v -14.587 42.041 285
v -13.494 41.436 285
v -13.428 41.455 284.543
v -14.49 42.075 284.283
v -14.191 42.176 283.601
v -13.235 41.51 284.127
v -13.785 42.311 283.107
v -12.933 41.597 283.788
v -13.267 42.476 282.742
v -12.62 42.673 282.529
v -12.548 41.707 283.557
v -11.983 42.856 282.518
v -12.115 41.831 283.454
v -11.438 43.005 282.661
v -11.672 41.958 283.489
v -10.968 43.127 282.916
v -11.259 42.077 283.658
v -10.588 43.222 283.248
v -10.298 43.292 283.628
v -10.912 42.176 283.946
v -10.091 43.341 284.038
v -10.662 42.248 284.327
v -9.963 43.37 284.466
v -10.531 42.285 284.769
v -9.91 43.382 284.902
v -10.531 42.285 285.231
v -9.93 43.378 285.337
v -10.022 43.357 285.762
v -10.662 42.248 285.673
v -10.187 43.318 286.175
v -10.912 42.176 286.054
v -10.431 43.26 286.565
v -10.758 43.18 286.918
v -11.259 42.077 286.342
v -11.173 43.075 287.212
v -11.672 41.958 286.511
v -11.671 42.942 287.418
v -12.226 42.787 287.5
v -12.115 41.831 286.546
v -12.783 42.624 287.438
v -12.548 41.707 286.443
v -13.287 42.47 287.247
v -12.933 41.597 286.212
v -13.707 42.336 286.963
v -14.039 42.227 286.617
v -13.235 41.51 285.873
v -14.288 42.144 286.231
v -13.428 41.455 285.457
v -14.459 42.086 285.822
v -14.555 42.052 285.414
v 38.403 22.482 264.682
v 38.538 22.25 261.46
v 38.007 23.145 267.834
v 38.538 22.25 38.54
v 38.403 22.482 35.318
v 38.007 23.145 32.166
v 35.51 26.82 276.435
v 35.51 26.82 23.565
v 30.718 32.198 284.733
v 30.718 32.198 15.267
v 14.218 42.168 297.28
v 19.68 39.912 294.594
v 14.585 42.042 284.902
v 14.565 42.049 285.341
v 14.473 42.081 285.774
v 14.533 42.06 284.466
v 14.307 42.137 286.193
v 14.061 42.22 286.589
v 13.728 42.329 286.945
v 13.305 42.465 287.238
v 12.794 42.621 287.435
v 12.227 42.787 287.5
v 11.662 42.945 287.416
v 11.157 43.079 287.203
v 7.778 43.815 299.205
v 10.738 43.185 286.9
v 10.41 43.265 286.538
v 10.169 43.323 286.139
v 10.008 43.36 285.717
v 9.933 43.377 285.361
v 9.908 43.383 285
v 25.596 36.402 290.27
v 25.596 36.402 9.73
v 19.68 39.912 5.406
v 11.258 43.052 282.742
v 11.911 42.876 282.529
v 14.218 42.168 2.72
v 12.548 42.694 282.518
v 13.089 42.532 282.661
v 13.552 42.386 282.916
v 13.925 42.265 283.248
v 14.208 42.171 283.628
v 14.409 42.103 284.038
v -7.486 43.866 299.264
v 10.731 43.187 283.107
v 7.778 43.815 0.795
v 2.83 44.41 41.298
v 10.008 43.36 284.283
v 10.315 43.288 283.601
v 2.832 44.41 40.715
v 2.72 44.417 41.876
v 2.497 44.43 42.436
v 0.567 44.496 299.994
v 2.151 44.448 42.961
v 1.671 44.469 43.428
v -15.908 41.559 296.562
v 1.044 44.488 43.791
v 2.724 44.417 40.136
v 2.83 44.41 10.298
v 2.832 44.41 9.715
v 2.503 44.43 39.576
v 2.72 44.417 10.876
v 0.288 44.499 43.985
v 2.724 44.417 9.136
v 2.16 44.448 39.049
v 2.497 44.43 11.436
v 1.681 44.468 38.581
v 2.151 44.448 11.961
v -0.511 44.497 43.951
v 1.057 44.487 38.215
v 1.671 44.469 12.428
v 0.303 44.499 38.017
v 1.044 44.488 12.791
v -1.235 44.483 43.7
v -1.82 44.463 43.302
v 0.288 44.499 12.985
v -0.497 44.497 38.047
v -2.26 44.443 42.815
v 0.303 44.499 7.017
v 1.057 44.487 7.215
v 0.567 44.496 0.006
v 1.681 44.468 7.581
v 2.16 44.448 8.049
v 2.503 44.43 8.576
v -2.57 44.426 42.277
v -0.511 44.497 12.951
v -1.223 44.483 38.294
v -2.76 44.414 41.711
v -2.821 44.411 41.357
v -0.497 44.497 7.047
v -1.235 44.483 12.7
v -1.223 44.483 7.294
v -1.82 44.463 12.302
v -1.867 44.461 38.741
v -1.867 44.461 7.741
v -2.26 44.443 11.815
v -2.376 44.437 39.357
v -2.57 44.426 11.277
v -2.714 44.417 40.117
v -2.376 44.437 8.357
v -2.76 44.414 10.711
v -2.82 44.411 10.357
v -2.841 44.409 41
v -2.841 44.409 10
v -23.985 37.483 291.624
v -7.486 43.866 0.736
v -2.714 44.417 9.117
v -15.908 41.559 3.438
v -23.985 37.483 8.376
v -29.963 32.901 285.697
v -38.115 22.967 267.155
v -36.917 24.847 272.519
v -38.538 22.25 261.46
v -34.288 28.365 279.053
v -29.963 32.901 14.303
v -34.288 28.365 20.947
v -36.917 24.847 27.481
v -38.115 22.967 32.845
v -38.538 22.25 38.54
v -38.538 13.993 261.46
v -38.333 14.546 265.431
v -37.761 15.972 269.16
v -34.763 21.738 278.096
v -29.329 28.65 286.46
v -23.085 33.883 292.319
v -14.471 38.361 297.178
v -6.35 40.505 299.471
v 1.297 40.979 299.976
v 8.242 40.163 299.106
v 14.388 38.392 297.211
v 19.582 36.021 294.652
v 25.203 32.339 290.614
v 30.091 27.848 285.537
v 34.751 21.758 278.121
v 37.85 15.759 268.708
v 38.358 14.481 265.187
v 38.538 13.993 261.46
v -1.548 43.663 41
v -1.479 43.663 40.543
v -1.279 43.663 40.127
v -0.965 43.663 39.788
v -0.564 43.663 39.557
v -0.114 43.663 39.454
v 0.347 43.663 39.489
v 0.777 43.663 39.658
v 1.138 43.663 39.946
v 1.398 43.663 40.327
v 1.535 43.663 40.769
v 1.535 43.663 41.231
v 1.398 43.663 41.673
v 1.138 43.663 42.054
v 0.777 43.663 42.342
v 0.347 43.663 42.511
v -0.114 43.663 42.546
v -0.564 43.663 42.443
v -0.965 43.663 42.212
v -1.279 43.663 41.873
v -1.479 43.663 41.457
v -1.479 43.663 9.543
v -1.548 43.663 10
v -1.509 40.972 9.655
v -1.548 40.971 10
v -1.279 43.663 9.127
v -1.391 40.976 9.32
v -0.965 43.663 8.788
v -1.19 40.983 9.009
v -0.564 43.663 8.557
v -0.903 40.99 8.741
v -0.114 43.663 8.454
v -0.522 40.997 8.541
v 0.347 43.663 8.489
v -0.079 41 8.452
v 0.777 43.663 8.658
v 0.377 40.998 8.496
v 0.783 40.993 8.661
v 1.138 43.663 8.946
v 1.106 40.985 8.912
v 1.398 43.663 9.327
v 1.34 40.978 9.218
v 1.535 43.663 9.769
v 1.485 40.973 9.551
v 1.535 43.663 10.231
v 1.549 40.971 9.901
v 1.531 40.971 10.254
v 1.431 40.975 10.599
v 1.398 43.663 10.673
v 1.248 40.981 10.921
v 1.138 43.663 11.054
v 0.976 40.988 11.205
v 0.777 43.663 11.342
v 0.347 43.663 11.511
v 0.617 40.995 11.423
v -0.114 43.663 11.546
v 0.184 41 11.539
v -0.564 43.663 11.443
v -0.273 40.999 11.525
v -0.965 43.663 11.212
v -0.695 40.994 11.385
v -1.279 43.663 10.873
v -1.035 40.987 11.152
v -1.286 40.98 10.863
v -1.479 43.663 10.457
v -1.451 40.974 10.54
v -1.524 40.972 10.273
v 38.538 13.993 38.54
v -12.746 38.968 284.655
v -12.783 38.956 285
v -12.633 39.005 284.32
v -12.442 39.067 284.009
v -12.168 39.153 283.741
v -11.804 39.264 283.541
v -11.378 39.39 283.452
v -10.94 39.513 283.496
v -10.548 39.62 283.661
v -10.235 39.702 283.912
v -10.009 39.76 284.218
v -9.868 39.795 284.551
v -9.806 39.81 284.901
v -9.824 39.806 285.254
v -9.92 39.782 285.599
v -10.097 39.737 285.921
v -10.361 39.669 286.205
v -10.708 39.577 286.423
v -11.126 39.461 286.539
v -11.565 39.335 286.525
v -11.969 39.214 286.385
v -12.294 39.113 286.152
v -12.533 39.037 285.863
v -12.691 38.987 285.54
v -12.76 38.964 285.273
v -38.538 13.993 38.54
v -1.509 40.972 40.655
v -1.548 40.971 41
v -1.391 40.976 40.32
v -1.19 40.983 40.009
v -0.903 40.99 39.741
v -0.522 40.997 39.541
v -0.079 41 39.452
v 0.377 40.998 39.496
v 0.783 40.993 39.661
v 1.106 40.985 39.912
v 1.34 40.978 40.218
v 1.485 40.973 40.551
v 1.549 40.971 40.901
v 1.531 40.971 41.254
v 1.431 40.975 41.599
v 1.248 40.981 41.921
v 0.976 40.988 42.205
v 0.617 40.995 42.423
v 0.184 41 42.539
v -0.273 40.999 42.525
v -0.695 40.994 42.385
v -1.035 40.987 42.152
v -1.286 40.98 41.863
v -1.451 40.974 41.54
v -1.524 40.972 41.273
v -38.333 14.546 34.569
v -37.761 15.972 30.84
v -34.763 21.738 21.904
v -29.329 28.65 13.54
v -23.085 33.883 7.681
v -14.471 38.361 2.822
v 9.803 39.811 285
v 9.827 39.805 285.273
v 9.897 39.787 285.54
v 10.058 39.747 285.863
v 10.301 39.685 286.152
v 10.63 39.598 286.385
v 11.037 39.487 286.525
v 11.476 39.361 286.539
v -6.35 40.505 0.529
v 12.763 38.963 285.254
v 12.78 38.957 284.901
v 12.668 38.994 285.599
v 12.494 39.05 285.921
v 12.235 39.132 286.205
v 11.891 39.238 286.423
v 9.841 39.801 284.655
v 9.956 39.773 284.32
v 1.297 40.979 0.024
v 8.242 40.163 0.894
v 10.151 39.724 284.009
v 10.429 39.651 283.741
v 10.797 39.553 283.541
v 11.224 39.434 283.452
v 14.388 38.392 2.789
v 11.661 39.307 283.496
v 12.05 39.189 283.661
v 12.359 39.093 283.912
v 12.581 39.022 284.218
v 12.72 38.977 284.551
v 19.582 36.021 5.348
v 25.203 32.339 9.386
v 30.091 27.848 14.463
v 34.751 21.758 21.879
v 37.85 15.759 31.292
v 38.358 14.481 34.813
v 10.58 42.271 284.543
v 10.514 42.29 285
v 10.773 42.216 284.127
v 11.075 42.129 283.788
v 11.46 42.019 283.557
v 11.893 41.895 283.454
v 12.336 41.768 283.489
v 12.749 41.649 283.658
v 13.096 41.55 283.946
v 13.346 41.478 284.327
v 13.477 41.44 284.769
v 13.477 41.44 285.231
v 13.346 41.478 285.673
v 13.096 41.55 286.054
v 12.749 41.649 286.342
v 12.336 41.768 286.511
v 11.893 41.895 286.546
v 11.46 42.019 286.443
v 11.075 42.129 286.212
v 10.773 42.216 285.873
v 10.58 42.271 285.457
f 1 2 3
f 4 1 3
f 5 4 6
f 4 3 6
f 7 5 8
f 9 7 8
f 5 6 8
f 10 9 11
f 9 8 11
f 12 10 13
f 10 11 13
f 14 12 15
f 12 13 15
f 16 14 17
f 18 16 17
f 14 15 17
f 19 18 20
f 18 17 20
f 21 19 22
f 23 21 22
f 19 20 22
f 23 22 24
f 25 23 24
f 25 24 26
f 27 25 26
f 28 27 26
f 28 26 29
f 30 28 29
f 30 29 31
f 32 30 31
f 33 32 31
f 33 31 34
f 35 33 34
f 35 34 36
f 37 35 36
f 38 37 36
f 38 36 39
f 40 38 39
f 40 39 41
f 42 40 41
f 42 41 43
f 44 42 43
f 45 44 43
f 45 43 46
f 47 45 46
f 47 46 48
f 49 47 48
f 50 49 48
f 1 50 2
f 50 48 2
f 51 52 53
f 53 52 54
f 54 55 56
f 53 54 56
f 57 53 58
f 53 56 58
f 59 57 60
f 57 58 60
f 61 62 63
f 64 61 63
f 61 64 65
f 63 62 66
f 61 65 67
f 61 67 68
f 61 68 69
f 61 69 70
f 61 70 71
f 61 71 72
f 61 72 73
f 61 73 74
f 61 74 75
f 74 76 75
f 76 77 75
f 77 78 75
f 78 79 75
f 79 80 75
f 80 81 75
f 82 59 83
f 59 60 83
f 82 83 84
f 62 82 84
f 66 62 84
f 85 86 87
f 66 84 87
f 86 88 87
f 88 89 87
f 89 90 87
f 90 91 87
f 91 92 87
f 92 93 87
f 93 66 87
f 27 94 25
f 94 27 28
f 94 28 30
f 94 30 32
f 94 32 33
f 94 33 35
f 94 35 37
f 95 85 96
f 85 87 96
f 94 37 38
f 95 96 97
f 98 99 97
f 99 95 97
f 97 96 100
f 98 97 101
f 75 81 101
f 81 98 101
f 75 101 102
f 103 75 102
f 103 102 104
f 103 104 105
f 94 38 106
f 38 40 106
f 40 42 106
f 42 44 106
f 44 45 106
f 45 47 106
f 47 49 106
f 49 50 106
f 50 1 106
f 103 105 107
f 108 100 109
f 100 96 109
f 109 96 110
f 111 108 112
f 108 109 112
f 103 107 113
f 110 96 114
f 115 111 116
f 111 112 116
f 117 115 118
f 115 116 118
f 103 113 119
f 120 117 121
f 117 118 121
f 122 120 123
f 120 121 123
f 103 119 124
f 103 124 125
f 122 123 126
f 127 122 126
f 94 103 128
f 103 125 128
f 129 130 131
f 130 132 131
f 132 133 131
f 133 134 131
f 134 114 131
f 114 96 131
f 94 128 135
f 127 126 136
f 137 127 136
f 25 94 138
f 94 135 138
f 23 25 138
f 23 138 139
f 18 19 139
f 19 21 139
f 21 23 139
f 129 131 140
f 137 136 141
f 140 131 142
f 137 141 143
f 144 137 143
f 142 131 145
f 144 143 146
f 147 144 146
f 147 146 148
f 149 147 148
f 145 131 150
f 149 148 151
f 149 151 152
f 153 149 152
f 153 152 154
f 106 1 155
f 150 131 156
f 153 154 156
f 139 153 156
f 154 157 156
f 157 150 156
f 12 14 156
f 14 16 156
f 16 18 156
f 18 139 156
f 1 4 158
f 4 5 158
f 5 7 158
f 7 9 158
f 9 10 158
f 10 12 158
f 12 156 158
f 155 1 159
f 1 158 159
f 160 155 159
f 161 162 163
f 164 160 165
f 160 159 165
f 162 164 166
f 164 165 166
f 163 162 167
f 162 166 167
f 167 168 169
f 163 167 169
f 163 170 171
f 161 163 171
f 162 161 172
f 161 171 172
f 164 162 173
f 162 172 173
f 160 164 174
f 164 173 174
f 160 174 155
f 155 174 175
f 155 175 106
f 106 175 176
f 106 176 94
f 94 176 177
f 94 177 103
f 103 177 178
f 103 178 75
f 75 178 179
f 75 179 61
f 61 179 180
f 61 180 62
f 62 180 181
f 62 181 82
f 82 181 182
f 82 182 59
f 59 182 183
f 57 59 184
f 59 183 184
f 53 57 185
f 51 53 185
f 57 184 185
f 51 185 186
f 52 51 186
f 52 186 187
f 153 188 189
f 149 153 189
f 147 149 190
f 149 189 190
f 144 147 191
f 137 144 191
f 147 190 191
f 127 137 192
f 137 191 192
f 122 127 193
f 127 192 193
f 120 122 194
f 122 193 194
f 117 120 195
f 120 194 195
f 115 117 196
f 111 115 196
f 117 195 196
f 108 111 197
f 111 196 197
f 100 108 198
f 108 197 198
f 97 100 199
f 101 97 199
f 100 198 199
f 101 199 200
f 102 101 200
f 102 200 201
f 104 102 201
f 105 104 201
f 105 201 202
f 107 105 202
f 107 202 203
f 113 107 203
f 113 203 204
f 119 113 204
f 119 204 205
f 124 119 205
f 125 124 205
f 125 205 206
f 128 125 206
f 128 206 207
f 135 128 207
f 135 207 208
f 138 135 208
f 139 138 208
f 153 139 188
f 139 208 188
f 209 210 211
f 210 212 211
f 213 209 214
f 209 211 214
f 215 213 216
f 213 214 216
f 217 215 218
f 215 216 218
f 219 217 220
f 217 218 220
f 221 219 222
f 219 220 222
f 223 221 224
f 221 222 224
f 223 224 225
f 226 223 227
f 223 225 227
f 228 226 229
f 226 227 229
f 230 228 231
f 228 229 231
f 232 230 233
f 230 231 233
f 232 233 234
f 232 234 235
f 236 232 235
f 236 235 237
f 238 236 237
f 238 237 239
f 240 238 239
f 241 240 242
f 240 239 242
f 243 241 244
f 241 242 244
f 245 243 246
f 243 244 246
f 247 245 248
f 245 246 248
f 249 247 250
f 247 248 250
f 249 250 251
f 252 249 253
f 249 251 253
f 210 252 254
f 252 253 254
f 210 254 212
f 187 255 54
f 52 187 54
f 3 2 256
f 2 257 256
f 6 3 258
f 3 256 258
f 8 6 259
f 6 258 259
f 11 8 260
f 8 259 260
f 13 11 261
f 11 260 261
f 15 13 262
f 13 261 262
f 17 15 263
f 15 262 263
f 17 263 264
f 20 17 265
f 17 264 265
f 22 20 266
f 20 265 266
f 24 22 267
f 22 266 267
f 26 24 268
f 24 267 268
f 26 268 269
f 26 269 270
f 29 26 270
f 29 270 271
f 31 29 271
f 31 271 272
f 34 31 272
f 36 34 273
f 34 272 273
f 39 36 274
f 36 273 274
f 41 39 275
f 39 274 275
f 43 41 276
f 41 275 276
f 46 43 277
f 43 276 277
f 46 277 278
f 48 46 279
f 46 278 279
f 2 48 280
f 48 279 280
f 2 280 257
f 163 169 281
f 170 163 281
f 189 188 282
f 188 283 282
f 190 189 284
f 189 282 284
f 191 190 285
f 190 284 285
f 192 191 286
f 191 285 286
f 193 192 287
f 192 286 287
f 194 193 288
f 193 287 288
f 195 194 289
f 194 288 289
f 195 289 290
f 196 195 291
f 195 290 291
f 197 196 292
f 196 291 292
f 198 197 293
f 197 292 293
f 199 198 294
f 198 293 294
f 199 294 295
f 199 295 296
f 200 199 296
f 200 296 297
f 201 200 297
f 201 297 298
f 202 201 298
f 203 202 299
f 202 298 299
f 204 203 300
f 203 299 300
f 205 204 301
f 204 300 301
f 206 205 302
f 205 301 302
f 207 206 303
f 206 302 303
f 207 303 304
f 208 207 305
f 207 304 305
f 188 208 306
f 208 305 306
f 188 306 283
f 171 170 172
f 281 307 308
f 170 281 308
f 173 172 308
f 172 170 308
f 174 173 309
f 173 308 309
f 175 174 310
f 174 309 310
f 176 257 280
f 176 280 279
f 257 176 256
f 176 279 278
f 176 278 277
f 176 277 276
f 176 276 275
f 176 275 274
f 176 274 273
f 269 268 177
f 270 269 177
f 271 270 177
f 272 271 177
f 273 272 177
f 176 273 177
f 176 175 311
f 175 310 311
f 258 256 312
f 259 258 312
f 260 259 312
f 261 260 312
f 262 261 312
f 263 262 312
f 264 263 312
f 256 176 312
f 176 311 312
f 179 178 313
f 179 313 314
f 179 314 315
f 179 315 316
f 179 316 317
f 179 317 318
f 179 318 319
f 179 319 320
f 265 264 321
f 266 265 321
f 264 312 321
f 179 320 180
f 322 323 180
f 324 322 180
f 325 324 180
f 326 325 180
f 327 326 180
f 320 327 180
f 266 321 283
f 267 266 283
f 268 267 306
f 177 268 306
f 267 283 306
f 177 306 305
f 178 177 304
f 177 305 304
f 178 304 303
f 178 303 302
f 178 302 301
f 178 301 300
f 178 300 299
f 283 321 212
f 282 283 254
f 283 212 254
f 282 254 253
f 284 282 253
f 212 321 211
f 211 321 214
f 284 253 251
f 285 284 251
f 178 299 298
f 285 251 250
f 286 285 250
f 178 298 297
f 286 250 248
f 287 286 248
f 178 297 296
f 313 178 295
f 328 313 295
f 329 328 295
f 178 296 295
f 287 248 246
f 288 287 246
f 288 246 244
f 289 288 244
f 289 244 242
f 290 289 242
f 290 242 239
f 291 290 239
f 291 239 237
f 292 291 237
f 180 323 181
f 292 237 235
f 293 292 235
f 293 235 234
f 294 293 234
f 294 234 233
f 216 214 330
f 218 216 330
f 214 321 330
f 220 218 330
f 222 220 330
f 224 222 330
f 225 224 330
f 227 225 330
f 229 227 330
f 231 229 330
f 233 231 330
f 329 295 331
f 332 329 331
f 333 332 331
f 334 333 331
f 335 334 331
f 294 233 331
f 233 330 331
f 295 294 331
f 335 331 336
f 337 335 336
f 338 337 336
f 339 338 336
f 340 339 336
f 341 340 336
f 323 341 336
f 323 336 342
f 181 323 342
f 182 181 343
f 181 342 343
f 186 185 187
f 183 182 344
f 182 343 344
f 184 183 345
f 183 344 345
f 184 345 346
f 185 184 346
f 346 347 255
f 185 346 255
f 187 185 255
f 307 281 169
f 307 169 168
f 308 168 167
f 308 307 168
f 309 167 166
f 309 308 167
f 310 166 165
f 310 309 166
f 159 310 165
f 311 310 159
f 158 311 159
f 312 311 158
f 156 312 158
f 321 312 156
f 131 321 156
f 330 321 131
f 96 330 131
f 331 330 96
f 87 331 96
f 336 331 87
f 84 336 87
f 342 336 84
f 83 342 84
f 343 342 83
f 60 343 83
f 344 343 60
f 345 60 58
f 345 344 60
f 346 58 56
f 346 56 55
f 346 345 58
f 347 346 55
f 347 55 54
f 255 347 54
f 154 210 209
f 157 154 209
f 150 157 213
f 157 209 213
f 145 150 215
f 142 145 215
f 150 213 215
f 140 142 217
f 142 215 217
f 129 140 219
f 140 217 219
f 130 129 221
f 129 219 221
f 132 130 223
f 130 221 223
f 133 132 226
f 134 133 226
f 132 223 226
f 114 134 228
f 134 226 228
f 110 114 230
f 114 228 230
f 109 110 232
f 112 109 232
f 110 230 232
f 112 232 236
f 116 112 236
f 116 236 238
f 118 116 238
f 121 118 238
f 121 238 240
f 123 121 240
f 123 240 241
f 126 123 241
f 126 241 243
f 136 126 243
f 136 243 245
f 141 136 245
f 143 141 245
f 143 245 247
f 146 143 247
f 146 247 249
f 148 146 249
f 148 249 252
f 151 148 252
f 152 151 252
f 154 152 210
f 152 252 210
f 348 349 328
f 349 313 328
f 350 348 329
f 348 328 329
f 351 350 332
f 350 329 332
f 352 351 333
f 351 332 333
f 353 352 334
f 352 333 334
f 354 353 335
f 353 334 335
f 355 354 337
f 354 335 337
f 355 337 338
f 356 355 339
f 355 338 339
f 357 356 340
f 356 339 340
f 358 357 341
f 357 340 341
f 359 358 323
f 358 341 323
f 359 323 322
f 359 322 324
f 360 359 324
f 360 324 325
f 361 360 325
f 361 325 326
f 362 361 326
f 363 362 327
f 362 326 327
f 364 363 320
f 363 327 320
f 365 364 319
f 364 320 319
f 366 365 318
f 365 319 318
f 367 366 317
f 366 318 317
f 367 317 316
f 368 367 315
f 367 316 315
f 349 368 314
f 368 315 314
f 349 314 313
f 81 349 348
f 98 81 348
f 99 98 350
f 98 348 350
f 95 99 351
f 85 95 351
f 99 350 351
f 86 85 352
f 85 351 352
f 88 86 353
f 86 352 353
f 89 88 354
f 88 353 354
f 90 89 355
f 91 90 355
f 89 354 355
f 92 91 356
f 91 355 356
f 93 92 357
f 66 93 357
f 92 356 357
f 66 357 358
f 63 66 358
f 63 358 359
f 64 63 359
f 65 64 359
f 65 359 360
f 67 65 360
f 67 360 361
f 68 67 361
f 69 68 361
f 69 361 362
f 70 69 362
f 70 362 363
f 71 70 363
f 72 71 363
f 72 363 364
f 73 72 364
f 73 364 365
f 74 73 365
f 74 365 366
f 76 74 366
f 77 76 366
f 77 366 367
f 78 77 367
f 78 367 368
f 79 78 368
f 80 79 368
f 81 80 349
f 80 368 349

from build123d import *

# Parameters (mm, degrees)
BOSS_EXTRU_1_DEPTH                   = 300
ENL_V_MAT_EXTRU_1_DEPTH              = 45.5
D_GAGEMENT_M21_D                     = 3.1
D_GAGEMENT_M21_CSINK_D               = 6
D_GAGEMENT_M21_CSINK_ANGLE           = 120
R_P_TITION_LIN_AIRE1_COUNT           = 2
R_P_TITION_LIN_AIRE1_PITCH           = 31
D_GAGEMENT_M41_D                     = 3.1
D_GAGEMENT_M41_DEPTH                 = 30
D_GAGEMENT_M41_CSINK_D               = 5
D_GAGEMENT_M41_CSINK_ANGLE           = 90
D_GAGEMENT_M41_TIP                   = 0.931333959
D_GAGEMENT_M41_ON_FACE_2_D           = 3.1
D_GAGEMENT_M41_ON_FACE_2_DEPTH       = 30
D_GAGEMENT_M41_ON_FACE_2_CSINK_D     = 5
D_GAGEMENT_M41_ON_FACE_2_CSINK_ANGLE = 90
D_GAGEMENT_M41_ON_FACE_2_TIP         = 0.931333959


with BuildPart() as part:
    # Esquisse1 → Boss.-Extru.1 (new body)
    with BuildSketch(Plane.XY):
        with BuildLine():
            Line((-38.538130468, 22.25), (-38.538130468, 13.993301969))
            ThreePointArc((-38.538130468, 13.993301969), (0, 41), (38.538130468, 13.993301969))
            Line((38.538130468, 13.993301969), (38.538130468, 22.25))
            ThreePointArc((38.538130468, 22.25), (0, 44.5), (-38.538130468, 22.25))
        make_face()
    extrude(amount=BOSS_EXTRU_1_DEPTH)

    # Esquisse2 → Enlèv. mat.-Extru.1 (cut, through all)
    with BuildSketch(Plane(origin=(0, 0, 0), x_dir=(1, 0, 0), z_dir=(0, 1, 0))):
        with BuildLine():
            Line((38.538130468, -261.46), (70.818354585, -261.46))
            Line((70.818354585, -261.46), (70.818354585, -316.268787276))
            Line((70.818354585, -316.268787276), (-50.118143928, -316.268787276))
            Line((-50.118143928, -316.268787276), (-50.118143928, -261.46))
            Line((-50.118143928, -261.46), (-38.538130468, -261.46))
            ThreePointArc((-38.538130468, -261.46), (0, -299.998130468), (38.538130468, -261.46))
        make_face()
    enl_v_mat_extru_1 = extrude(amount=ENL_V_MAT_EXTRU_1_DEPTH, mode=Mode.SUBTRACT)

    # Symétrie1: Enlèv. mat.-Extru.1 across plane
    add(enl_v_mat_extru_1.mirror(Plane.XY.offset(150)), mode=Mode.SUBTRACT)

    # Dégagement M21 (through all)
    with Locations(Plane(origin=(0.001869532, 44.499999961, 10), x_dir=(0.999999999, -4.2012e-05, 0), z_dir=(4.2012e-05, 0.999999999, 0))):
        with Locations((0, 0)):
            d_gagement_m21 = CounterSinkHole(D_GAGEMENT_M21_D / 2, D_GAGEMENT_M21_CSINK_D / 2, counter_sink_angle=D_GAGEMENT_M21_CSINK_ANGLE)

    # Répétition linéaire1: Dégagement M21 ×2
    with Locations(*[(0, 0, i * R_P_TITION_LIN_AIRE1_PITCH) for i in range(1, R_P_TITION_LIN_AIRE1_COUNT)]):
        add(d_gagement_m21, mode=Mode.SUBTRACT)

    # Dégagement M41
    with Locations(Plane(origin=(-12.265862334, 42.776145469, 285), x_dir=(0.961261696, 0.275637356, 0), z_dir=(-0.275637356, 0.961261696, 0))):
        with Locations((0, 0)):
            CounterSinkHole(D_GAGEMENT_M41_D / 2, D_GAGEMENT_M41_CSINK_D / 2, depth=D_GAGEMENT_M41_DEPTH, counter_sink_angle=D_GAGEMENT_M41_CSINK_ANGLE)
            with Locations((0, 0, -(D_GAGEMENT_M41_DEPTH + D_GAGEMENT_M41_TIP / 2))):  # 118° drill point
                Cone(0, D_GAGEMENT_M41_D / 2, D_GAGEMENT_M41_TIP, mode=Mode.SUBTRACT)

    # Dégagement M41 on face 2
    with Locations(Plane(origin=(12.265862334, 42.776145469, 285), x_dir=(0.961261813, -0.275636946, 0), z_dir=(0.275636946, 0.961261813, 0))):
        with Locations((0, 0)):
            CounterSinkHole(D_GAGEMENT_M41_ON_FACE_2_D / 2, D_GAGEMENT_M41_ON_FACE_2_CSINK_D / 2, depth=D_GAGEMENT_M41_ON_FACE_2_DEPTH, counter_sink_angle=D_GAGEMENT_M41_ON_FACE_2_CSINK_ANGLE)
            with Locations((0, 0, -(D_GAGEMENT_M41_ON_FACE_2_DEPTH + D_GAGEMENT_M41_ON_FACE_2_TIP / 2))):  # 118° drill point
                Cone(0, D_GAGEMENT_M41_ON_FACE_2_D / 2, D_GAGEMENT_M41_ON_FACE_2_TIP, mode=Mode.SUBTRACT)


solid = part.part
